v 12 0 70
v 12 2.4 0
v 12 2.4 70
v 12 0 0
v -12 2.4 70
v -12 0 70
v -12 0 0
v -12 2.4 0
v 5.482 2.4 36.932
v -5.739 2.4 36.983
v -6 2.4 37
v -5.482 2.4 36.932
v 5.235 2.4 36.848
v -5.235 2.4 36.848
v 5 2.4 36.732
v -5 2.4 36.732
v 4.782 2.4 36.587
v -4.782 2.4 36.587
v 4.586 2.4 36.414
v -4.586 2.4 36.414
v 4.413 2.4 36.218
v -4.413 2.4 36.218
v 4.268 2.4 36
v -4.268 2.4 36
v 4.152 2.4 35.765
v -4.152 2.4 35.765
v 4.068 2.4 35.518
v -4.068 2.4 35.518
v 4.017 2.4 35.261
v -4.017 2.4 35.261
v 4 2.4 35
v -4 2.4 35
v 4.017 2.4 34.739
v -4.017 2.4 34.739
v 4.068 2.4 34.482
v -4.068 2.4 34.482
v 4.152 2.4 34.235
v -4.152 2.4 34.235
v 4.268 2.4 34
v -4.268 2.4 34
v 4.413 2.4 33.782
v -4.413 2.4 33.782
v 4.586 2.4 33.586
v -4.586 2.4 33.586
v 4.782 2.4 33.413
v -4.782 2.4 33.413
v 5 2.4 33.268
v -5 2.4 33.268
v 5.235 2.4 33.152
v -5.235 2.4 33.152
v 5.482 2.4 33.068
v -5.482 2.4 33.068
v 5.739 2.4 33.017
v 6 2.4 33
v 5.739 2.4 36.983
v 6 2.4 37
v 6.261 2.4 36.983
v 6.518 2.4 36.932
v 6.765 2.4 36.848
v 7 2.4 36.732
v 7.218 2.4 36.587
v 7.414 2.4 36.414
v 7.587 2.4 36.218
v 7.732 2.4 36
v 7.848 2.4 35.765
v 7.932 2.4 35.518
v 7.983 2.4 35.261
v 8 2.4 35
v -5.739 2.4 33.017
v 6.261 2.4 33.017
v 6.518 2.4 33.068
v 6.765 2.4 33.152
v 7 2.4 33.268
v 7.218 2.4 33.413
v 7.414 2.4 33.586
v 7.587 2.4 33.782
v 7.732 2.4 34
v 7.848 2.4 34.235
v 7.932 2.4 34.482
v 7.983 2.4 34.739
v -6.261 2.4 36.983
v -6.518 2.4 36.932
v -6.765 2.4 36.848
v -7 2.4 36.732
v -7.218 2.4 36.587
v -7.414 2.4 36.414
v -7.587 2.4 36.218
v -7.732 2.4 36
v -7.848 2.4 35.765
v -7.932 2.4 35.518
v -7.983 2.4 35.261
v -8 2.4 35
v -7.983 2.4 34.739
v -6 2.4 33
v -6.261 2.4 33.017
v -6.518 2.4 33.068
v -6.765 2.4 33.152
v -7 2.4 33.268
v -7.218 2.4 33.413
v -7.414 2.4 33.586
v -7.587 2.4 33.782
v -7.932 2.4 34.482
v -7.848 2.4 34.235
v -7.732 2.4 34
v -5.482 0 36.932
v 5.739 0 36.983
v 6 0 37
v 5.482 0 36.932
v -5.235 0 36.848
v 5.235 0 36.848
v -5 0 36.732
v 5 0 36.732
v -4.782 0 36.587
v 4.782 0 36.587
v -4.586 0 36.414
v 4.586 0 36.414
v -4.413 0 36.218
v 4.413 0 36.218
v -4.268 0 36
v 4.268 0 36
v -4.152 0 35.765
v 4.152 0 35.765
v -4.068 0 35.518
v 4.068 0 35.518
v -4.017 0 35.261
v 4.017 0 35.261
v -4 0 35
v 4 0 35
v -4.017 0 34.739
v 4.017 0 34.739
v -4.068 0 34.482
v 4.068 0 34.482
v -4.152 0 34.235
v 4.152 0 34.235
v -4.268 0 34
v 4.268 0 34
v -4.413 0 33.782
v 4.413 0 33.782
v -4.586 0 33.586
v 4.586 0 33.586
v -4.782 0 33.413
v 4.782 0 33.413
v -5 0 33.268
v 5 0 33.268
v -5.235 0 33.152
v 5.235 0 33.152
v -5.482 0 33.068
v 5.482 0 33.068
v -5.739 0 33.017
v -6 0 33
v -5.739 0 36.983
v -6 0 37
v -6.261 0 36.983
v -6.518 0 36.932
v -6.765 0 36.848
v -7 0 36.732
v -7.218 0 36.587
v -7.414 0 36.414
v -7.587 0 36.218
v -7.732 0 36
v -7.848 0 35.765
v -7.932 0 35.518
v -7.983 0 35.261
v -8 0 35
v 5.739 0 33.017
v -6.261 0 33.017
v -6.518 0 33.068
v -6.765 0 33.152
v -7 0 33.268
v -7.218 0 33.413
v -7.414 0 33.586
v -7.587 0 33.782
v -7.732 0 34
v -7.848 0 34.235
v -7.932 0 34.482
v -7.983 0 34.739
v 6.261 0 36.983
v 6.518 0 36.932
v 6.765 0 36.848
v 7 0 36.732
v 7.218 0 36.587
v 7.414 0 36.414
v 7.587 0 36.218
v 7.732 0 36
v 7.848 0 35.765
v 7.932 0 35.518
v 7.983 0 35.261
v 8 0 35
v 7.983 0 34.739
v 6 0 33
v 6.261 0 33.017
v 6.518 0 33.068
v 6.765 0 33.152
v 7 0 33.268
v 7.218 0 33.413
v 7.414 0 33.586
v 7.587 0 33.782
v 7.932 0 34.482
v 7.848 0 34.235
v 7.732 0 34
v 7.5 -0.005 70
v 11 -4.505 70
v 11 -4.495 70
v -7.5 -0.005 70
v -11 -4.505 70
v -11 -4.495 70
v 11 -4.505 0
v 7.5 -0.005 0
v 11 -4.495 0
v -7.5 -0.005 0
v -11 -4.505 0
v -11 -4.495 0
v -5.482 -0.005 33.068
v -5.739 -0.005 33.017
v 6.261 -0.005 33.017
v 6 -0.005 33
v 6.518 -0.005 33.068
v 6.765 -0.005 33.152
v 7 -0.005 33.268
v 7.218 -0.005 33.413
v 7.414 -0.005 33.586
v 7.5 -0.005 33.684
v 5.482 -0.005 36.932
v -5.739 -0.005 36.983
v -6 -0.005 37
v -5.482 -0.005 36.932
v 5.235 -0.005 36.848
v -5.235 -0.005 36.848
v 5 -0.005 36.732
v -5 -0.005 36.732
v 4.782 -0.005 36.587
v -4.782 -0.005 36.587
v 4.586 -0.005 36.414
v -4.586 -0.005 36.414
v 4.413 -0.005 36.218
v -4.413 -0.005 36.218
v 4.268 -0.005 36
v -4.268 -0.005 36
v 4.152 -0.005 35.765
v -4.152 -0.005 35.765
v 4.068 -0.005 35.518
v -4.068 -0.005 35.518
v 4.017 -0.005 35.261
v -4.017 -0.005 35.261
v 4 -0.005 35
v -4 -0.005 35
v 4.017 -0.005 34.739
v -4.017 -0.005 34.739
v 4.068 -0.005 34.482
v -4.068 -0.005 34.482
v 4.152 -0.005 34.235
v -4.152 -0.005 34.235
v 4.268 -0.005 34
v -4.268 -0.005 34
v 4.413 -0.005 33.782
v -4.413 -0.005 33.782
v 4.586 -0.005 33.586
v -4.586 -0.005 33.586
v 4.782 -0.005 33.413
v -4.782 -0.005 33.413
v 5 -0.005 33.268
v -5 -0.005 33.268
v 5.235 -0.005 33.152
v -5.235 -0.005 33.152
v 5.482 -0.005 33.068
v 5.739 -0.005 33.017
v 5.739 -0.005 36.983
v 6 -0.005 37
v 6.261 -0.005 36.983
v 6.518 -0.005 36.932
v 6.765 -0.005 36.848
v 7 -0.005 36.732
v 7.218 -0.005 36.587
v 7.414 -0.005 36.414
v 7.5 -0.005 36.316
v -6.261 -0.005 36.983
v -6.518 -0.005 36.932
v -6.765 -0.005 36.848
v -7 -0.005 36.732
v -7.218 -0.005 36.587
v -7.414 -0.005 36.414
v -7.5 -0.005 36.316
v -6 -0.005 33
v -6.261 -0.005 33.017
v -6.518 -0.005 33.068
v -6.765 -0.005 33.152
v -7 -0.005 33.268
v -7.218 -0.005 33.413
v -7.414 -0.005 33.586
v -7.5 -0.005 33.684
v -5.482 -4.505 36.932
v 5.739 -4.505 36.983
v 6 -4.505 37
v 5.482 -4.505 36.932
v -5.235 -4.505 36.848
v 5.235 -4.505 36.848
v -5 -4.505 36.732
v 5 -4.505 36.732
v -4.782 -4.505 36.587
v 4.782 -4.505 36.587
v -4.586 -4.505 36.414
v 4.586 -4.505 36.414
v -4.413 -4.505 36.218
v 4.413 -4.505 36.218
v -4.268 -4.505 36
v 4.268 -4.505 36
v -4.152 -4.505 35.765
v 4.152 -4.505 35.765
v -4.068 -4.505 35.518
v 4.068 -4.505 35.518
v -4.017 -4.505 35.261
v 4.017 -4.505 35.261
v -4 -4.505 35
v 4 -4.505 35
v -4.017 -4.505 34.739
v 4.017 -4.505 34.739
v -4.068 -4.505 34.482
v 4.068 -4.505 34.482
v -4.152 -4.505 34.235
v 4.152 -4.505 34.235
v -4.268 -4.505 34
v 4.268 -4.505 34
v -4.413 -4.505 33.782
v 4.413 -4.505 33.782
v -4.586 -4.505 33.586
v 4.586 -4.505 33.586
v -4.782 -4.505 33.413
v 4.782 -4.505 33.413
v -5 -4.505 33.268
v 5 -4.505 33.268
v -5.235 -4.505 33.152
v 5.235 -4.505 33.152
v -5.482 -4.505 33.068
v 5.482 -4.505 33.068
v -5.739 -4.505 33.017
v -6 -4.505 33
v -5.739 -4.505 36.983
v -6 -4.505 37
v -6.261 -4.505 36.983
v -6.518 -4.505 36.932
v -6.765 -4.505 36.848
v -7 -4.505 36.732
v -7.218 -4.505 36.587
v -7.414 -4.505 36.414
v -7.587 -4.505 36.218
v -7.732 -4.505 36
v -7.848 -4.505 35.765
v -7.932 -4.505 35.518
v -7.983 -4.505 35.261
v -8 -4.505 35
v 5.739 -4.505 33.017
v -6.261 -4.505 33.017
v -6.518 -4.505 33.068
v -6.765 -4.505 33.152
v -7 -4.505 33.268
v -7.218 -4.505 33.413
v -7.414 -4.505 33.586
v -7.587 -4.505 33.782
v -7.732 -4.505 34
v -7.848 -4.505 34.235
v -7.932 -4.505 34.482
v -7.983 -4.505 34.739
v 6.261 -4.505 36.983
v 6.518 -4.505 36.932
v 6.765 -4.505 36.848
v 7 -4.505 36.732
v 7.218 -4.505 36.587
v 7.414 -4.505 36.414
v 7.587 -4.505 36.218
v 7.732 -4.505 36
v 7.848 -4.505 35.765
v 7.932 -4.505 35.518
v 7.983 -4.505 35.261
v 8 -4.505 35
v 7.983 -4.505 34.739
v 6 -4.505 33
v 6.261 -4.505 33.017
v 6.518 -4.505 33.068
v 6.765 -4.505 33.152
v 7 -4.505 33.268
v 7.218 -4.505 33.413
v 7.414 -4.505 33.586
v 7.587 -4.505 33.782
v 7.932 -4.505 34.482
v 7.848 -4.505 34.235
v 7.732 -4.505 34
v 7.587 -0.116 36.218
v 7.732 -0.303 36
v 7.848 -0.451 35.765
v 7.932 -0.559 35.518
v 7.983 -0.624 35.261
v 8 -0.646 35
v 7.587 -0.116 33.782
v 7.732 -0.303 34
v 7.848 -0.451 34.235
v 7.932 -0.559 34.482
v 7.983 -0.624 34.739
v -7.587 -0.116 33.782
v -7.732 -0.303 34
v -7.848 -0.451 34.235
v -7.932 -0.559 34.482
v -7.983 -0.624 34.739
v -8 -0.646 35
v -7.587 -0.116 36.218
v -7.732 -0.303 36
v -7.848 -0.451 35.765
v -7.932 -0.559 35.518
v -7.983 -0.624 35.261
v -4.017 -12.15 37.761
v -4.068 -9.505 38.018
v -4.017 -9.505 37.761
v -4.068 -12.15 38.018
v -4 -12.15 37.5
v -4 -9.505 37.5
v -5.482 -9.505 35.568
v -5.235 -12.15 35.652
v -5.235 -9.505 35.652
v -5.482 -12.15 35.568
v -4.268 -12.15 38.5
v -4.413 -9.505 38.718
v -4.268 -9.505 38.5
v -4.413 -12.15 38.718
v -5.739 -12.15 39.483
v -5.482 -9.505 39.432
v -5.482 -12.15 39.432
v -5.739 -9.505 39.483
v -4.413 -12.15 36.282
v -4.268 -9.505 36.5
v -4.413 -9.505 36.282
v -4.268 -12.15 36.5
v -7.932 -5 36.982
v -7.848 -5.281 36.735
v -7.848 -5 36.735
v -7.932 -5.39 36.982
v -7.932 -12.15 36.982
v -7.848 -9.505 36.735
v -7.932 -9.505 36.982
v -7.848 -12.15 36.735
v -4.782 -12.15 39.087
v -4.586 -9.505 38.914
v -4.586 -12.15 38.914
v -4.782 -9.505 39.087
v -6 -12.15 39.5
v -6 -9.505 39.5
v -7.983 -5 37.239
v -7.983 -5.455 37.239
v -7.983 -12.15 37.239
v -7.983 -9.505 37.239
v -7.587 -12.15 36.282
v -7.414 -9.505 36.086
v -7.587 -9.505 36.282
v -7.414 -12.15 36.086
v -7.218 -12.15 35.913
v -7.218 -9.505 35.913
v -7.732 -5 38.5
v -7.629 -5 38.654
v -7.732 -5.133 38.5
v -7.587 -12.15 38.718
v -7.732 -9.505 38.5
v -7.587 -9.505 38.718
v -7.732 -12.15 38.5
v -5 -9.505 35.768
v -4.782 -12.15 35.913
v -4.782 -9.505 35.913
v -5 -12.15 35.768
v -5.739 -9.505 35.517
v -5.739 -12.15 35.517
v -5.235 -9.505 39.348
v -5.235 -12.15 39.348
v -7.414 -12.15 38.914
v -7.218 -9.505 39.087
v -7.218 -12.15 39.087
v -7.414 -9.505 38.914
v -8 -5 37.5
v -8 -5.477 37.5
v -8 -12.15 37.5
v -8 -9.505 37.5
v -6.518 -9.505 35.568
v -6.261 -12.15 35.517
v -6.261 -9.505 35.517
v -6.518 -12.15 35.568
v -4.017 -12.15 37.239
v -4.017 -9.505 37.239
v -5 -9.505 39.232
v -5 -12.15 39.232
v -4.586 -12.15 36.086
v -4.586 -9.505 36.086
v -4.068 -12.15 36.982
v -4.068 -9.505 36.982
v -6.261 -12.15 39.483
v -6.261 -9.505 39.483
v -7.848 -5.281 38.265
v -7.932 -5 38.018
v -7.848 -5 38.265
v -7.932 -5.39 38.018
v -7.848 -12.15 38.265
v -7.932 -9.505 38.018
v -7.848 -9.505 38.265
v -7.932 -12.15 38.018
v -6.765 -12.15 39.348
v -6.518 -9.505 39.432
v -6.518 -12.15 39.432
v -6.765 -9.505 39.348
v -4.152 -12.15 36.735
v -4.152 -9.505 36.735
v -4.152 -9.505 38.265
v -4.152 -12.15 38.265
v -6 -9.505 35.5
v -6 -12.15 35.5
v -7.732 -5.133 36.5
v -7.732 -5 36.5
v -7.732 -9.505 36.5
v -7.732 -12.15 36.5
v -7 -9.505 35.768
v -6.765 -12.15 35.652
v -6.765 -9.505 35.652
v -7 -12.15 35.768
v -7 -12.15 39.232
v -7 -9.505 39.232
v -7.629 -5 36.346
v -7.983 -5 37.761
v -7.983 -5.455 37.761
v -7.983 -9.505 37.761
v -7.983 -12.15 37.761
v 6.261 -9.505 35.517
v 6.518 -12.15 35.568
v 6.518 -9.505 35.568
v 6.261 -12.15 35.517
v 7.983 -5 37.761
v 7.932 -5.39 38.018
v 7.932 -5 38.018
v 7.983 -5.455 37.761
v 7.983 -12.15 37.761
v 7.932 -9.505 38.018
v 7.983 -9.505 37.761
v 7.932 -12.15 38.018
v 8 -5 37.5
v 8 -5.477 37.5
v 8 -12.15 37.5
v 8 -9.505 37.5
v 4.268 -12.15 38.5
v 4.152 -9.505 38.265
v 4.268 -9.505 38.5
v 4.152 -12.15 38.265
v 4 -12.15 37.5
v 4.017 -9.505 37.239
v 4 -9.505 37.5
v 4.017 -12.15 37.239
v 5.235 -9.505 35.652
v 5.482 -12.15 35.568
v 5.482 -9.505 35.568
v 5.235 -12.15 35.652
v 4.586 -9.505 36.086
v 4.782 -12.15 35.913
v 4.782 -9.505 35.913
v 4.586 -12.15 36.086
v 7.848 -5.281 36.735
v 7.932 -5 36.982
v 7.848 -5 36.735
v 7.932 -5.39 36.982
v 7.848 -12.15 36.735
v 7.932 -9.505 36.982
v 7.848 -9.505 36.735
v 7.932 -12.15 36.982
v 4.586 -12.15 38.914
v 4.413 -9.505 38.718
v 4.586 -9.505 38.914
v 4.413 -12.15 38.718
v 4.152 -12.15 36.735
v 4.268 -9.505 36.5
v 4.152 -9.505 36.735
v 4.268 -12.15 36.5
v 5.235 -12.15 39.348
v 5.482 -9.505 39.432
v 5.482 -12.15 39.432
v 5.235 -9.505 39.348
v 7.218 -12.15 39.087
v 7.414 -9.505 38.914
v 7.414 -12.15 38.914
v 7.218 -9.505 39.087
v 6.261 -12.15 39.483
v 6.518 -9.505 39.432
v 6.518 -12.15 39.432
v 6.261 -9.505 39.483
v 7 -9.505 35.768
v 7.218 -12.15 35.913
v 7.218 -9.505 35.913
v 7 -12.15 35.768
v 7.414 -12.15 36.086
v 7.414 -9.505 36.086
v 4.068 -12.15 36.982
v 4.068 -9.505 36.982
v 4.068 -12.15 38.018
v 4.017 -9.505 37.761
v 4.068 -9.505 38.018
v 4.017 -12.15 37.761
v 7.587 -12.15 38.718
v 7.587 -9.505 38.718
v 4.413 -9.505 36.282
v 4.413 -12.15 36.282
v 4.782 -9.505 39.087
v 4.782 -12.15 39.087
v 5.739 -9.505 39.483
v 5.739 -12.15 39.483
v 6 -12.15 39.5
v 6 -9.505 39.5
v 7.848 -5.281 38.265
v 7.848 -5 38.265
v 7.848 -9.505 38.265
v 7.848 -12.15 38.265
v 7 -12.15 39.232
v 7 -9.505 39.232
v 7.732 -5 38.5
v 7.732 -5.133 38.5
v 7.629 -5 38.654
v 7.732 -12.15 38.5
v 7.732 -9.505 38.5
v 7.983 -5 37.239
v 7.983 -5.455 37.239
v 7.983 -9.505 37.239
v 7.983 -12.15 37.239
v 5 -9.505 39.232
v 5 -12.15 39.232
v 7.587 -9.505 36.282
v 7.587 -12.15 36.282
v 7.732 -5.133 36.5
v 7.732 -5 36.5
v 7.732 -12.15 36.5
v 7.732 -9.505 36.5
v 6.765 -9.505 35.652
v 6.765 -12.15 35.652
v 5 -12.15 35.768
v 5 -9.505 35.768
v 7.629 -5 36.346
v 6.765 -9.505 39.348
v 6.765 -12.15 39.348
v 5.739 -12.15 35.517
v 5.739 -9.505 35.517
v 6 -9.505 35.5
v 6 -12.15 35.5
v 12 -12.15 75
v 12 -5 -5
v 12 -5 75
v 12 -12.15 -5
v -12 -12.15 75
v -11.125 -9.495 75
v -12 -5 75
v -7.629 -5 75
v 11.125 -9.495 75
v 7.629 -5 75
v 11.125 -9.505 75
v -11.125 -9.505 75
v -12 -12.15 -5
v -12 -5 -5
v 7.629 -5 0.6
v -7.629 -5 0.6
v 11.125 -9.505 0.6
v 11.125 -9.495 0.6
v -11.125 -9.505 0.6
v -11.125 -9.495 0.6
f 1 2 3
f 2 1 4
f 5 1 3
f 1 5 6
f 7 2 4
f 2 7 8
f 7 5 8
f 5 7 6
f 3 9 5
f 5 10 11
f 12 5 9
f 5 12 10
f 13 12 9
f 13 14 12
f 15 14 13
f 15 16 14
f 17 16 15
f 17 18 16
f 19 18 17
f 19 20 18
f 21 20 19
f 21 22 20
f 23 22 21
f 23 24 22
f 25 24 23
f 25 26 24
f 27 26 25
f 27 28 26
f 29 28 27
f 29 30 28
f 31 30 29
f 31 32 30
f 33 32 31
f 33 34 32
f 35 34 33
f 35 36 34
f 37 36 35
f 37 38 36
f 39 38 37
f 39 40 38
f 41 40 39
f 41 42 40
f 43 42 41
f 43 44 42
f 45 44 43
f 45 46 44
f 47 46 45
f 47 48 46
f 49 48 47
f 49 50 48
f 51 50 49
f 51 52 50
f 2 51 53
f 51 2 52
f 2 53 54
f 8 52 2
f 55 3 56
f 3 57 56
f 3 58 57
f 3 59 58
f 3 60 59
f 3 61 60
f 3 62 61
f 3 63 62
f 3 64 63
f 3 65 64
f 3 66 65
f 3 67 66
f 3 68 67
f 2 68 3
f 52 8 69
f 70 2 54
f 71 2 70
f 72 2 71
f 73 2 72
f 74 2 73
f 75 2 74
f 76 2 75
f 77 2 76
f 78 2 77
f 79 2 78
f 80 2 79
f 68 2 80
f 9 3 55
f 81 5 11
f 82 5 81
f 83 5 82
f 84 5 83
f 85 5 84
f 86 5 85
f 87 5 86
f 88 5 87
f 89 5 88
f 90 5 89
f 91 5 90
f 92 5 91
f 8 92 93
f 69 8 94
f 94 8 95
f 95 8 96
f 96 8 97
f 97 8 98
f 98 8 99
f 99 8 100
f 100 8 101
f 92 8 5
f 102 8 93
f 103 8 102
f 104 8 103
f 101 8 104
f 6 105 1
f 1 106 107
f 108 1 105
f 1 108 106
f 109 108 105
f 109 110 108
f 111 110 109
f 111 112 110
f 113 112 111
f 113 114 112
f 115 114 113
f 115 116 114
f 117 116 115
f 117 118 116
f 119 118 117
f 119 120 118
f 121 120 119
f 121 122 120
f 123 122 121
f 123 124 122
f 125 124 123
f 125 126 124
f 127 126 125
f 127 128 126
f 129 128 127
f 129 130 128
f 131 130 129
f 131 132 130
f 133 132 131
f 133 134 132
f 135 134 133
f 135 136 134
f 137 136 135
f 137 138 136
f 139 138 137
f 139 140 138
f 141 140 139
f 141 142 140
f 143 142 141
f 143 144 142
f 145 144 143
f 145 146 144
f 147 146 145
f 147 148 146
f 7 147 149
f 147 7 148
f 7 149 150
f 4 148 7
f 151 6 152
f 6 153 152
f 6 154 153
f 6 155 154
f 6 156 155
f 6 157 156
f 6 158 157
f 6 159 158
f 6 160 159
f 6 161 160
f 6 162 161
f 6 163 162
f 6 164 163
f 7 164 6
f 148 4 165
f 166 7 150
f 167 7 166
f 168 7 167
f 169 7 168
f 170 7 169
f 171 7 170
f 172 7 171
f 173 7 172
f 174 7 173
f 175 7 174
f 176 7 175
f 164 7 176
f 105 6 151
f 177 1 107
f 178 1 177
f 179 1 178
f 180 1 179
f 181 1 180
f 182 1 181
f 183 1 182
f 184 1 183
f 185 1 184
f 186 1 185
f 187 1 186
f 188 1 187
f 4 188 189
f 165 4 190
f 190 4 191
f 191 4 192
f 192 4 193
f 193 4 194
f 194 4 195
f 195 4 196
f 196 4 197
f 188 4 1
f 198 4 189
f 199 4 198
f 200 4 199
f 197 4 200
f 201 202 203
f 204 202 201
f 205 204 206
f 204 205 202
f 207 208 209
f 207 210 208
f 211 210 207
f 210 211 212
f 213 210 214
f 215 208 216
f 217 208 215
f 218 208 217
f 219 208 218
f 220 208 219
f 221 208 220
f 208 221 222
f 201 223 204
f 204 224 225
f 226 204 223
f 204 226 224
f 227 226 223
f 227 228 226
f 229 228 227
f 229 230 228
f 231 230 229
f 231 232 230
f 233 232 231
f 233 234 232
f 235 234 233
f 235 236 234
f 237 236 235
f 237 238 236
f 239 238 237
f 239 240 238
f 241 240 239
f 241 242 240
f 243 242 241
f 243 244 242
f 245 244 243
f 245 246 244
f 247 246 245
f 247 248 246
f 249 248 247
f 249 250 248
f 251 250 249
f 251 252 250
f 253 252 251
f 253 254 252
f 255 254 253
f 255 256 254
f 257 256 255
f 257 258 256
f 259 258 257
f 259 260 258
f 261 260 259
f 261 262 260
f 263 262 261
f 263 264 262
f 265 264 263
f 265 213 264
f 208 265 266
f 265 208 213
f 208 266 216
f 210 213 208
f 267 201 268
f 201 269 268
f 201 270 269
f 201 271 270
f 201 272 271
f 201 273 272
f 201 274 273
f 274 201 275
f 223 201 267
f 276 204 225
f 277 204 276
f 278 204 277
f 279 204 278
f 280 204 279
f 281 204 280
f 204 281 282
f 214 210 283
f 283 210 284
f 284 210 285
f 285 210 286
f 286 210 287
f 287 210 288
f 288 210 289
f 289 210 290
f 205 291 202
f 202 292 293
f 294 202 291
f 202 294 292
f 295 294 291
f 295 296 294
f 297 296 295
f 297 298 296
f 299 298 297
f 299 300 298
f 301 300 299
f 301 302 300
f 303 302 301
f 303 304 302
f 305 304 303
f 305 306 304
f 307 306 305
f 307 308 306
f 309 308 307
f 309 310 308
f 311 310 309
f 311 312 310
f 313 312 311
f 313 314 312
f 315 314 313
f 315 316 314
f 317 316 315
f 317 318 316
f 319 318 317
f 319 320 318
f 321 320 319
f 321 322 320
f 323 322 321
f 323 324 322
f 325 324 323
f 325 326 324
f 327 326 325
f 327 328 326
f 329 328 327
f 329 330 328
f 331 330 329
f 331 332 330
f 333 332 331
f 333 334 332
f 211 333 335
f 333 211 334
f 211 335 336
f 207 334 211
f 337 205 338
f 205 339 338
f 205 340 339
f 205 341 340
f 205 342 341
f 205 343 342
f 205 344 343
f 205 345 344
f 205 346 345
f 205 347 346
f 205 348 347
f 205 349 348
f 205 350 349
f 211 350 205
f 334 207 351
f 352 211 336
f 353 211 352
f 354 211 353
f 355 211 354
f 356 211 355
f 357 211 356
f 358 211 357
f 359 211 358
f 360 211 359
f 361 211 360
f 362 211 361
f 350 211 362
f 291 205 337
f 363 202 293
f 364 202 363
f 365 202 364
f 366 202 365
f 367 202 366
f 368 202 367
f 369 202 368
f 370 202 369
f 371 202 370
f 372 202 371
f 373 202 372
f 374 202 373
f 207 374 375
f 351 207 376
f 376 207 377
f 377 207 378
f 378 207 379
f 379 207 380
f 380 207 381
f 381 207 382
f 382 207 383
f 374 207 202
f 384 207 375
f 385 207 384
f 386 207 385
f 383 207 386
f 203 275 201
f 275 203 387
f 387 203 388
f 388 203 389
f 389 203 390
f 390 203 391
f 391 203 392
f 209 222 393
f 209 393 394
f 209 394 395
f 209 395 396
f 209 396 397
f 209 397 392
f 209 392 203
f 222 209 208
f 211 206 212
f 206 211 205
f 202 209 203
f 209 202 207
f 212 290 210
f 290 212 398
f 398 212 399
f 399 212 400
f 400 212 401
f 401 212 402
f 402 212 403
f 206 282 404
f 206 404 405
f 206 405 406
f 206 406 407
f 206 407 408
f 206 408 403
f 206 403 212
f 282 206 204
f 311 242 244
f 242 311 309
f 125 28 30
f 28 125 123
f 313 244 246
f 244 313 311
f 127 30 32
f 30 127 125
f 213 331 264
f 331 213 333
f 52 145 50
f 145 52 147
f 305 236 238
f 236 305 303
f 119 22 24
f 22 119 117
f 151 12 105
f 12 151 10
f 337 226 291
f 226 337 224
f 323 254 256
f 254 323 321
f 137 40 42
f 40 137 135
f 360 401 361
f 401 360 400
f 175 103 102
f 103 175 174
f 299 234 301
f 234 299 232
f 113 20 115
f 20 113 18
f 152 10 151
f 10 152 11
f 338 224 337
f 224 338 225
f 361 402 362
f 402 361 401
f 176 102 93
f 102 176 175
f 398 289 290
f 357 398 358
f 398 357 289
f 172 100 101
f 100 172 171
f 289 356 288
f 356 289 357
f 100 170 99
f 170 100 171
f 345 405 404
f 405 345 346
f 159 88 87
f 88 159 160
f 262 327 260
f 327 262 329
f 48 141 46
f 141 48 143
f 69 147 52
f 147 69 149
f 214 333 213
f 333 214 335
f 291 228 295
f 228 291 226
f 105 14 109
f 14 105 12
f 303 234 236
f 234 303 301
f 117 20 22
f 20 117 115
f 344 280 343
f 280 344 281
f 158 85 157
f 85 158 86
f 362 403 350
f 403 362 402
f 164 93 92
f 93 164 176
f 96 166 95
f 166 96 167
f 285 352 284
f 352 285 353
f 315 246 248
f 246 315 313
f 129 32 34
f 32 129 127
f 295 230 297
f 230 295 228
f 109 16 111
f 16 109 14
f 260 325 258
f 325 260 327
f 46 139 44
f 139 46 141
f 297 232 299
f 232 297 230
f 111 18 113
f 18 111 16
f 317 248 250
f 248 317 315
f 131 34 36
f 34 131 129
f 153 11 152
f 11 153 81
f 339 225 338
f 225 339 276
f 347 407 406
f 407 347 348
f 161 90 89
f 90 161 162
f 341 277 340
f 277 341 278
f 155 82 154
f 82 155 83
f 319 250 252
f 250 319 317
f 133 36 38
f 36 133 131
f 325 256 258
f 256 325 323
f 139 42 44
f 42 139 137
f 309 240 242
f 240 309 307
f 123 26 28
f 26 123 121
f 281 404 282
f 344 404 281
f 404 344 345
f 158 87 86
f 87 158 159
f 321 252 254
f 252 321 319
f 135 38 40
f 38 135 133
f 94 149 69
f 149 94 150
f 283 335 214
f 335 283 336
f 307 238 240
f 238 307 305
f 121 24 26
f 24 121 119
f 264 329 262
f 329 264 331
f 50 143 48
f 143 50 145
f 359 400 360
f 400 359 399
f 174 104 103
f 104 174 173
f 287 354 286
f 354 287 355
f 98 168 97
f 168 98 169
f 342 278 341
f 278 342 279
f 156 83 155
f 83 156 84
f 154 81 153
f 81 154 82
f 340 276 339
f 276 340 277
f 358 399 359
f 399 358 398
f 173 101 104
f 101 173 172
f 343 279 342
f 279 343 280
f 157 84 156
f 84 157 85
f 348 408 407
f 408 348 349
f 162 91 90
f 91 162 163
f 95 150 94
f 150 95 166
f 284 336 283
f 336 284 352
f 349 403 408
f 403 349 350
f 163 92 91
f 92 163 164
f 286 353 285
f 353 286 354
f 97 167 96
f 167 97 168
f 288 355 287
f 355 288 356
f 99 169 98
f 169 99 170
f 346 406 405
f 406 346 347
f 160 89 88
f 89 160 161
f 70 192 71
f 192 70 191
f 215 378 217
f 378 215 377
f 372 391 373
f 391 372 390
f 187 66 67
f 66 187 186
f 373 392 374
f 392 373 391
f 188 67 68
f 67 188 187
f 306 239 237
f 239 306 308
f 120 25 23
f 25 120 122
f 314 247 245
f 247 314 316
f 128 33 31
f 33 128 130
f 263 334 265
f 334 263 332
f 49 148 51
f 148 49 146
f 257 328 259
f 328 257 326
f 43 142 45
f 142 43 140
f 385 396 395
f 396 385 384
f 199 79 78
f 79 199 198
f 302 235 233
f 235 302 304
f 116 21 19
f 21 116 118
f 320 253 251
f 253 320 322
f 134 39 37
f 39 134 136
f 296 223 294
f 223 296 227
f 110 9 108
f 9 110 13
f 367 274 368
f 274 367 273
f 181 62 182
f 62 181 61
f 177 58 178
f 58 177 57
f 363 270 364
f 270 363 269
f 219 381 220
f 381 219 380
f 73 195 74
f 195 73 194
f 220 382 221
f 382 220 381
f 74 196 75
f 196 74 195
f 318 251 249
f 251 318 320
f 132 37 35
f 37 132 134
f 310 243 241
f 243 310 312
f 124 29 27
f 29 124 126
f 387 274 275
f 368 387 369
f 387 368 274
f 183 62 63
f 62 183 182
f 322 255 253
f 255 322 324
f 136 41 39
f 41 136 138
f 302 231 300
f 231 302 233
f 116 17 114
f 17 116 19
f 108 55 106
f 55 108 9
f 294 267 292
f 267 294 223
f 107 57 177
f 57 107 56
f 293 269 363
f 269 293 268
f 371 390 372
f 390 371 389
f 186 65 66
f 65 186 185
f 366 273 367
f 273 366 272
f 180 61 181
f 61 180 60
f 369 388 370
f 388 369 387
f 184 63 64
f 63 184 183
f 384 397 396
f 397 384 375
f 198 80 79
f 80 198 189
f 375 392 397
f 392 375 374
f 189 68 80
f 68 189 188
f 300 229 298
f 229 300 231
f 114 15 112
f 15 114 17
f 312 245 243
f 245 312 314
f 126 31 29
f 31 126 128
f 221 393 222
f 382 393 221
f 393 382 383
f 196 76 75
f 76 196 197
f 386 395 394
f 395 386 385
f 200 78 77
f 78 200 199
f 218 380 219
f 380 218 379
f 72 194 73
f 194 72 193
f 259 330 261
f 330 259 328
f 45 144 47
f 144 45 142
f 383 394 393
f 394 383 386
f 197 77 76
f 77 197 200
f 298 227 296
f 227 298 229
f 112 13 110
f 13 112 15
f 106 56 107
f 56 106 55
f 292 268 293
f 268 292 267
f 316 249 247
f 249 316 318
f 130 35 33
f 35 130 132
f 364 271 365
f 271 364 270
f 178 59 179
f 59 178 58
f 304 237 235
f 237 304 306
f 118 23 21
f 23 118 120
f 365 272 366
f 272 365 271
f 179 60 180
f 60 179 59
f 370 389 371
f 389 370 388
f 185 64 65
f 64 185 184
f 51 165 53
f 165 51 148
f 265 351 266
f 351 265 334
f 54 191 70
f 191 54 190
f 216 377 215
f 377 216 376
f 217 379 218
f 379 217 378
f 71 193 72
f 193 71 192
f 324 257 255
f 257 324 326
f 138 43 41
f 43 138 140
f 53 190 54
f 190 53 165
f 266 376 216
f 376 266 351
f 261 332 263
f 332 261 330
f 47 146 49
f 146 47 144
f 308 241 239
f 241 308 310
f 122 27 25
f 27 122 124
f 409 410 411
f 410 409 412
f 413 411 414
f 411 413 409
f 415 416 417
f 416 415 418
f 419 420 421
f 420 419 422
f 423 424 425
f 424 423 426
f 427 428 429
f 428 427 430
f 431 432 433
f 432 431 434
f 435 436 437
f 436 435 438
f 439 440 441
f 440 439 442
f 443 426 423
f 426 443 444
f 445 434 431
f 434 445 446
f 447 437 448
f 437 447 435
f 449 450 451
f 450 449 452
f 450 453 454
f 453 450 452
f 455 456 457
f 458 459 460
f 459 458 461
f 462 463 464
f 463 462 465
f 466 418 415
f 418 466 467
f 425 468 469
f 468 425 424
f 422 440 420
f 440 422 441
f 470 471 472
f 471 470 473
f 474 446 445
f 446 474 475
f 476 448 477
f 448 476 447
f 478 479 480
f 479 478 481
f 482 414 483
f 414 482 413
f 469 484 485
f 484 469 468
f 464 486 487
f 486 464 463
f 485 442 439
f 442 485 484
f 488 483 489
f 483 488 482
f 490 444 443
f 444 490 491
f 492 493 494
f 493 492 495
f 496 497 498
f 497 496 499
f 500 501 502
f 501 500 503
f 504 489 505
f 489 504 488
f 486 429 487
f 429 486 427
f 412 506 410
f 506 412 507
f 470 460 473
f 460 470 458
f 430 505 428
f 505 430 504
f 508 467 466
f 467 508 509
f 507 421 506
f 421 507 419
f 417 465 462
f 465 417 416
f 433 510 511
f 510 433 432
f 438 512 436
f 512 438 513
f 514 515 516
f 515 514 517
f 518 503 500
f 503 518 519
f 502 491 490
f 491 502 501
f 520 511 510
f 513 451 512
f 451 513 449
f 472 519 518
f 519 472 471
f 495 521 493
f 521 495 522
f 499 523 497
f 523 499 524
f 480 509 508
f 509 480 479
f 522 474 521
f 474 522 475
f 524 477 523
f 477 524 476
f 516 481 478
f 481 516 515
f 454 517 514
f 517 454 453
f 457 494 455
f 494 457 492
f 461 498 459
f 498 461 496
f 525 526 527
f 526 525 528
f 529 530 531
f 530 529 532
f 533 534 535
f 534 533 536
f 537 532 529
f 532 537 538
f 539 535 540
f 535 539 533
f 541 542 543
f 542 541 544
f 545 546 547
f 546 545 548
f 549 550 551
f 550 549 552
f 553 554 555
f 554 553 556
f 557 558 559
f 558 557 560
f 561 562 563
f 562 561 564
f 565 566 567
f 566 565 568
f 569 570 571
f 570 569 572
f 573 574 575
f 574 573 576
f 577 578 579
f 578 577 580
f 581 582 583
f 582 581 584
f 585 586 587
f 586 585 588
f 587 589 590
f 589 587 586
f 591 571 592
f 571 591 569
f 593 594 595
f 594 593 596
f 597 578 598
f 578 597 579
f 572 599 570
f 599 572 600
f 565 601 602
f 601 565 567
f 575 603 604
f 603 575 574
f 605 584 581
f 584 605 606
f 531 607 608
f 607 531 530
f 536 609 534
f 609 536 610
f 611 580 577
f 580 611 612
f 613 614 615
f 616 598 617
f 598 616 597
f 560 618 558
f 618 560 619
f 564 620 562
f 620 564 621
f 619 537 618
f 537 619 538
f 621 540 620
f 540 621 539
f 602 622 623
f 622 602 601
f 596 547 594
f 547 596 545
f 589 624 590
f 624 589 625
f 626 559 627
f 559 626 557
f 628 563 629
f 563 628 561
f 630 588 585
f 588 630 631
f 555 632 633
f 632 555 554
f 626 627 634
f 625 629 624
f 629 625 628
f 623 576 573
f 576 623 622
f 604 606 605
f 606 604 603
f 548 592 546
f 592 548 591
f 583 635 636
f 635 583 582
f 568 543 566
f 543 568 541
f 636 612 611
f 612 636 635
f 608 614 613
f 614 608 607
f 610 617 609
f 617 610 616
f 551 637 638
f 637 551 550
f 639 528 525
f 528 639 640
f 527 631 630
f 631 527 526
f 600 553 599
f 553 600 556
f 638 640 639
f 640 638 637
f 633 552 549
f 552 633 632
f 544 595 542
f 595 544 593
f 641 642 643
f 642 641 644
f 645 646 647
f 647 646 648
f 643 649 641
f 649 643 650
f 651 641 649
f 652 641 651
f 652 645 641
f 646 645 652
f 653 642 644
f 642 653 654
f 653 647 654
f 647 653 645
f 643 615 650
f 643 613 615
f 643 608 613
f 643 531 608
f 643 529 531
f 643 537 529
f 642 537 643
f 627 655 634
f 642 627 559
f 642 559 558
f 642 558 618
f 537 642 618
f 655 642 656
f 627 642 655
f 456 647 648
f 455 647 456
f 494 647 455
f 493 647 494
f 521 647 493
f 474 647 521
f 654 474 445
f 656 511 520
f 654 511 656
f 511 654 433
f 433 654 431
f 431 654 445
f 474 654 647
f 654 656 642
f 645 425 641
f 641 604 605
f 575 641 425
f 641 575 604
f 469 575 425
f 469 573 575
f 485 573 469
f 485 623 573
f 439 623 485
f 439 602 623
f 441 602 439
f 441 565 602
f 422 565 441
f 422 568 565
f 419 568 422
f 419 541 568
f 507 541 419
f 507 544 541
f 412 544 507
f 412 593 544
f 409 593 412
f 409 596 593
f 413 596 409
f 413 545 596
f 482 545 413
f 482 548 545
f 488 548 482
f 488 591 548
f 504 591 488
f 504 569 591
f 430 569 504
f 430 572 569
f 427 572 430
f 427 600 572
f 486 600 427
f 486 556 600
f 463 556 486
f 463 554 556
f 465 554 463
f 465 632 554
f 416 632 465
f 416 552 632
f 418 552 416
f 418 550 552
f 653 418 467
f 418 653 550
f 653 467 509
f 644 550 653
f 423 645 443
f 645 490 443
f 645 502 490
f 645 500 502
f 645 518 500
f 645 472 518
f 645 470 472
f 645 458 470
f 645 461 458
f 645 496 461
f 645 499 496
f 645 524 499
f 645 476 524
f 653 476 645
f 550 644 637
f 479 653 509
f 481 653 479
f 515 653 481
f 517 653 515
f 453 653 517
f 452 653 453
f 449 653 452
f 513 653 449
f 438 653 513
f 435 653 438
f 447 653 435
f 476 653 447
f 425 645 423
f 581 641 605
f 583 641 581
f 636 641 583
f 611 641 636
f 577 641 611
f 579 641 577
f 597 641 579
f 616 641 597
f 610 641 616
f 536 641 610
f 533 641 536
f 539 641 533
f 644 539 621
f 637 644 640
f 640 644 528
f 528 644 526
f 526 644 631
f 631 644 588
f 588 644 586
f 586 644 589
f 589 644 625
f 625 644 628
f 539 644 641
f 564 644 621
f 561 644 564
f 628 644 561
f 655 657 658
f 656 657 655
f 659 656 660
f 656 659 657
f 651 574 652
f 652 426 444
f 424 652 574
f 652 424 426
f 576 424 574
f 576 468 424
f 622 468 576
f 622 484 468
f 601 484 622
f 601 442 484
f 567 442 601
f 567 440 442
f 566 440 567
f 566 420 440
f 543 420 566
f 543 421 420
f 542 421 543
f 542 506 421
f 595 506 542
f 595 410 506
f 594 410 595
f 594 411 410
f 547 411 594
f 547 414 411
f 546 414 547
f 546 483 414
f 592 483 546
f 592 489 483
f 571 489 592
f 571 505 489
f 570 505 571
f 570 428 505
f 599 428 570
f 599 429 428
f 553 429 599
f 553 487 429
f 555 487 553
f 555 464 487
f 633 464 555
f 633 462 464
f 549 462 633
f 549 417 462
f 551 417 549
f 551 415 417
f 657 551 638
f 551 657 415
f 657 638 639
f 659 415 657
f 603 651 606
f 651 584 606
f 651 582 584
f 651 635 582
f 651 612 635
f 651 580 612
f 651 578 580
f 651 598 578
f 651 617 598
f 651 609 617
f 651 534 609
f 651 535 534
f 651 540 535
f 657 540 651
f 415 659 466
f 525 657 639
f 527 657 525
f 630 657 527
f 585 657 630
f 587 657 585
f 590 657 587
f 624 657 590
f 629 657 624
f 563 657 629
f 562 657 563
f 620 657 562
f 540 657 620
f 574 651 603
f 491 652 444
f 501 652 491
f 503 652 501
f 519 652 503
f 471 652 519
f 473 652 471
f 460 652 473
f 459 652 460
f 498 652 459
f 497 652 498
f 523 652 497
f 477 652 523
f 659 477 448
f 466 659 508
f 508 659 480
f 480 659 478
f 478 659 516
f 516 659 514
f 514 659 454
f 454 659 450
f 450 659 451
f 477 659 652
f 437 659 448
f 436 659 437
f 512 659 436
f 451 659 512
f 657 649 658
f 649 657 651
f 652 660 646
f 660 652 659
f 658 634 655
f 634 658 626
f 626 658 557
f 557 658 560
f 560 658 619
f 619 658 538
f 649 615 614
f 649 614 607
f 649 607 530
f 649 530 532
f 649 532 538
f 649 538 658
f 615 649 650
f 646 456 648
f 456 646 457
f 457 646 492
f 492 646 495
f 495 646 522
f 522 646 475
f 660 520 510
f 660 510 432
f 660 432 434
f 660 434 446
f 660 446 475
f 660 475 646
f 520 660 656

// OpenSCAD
/* ========================================================================== 
   Dovetail Model for 3D Printing
   Designed by Notydesign
   License: CC BY-NC-SA 4.0 (https://creativecommons.org/licenses/by-nc-sa/4.0/)
   Source: https://github.com/Noty-design/Parametric-designs
   
   Description: Dovetail from the box/bin model, extracted and parameterized. 
   The dovetail can be screwed or glued to the back of what is mounted. 
   Designed by Notydesign.  
   Comments and documentation added for easier maintenance.  

    This file is intentionally heavily commented so future parameter and geometry
   changes are easier to make safely.
   ========================================================================== */ 

// All dimensions in this file are millimeters. 
// X is width, Y is depth/thickness, and Z is height. 

/* [Display options] */ // Groups settings that control preview visibility.
show_dovetail = true; // Shows the male dovetail part.
show_bracket = true; // Shows the female bracket part.
mirror_backstop = false; // Rotates the preview 180 degrees around the Y axis so the stop is mirrored.
color = "#4682B4"; // Sets the preview color for both generated parts.

/* [Dovetail male parameters] */ // Groups the main dimensions for the male dovetail.
dovetail_width_wide = 22; // Sets the widest width of the dovetail profile at the outer face.
dovetail_width_narrow = 15; // Sets the narrowest width of the dovetail profile near the plate.
dovetail_depth = 4.5; // Sets how far the dovetail profile projects in the Y direction.
dovetail_tolerance = 0.25; // Sets clearance between the male and female parts for 3D printing fit.
dovetail_plate_width = 24; // Sets the width of the male mounting plate.
dovetail_plate_thickness = 2.4; // Sets the thickness of the male mounting plate.
dovetail_plate_height = 70; // Sets the total height of the male dovetail part.

/* [Dovetail male screw hole parameters] */ // Groups screw-hole settings for the male part.
show_dovetail_screw_holes = true; // Enables through screw holes in the male part.
dovetail_screw_count = 2; // Sets the number of screw holes per row in the X direction.
dovetail_screw_row_count = 1; // Sets the number of screw rows in the Z direction.
dovetail_screw_row_spacing = 20; // Sets the center-to-center spacing between screw rows.
dovetail_screw_edge_margin = 6; // Sets the margin from each side edge to the outermost screw hole.
mount_screw_hole_diameter = 4; // Sets the diameter of the male screw holes.

/* [Dovetail male countersink parameters] */ // Groups countersink settings for the male screw holes.
male_screw_countersink_style = "none"; // [none, cone, cylinder, nut]
male_screw_countersink_side = "back"; // Selects the countersink side: front, back, or both.
male_screw_countersink_diameter = 8; // Sets the outer diameter of the male countersink.
male_screw_countersink_depth = 1.6; // Sets how deep the male countersink cuts into the part.
male_screw_nut_size = "M4"; // [M2, M3, M4, M5, M6, M7, M8, M9, M10, M11, M12, M13, M14]

/* [Dovetail female parameters] */ // Groups the main dimensions for the female bracket.
dovetail_female_extra_height = 5; // Adds extra height above the nominal male-part height.
dovetail_female_extra_width = 0; // Adds extra side material to the female block.
dovetail_female_rail_rib_depth = 0; // Adds outside 45-degree strengthening ribs when greater than zero.
dovetail_female_backstop_bridge_height = 0.6; // Keeps a small solid bridge above the stop so the bracket remains one connected body.
female_backstop = 5.0; // Sets the stop height below the slot so the male part cannot slide through.

/* [Dovetail female screw hole parameters] */ // Groups screw-hole settings for the female part.
show_female_screw_holes = true; // Enables through screw holes in the female part.
dovetail_female_screw_count = 2; // Sets the number of female screw holes per row in the X direction.
dovetail_female_screw_row_count = 1; // Sets the number of female screw rows in the Z direction.
dovetail_female_screw_row_spacing = 20; // Sets the center-to-center spacing between female screw rows.
dovetail_female_screw_edge_margin = 6; // Sets the margin from each female side edge to the outermost screw hole.
dovetail_female_mount_screw_hole_diameter = 4; // Sets the diameter of the female screw holes.

/* [Metric nut countersink parameters] */ // Groups settings for hexagonal metric-nut-shaped countersinks.
metric_nut_countersink_clearance = 0.25; // Adds extra flat-to-flat clearance to metric nut pockets for printer tolerance.

/* [Dovetail female countersink parameters] */ // Groups countersink settings for the female screw holes.
female_screw_countersink_style = "none"; // [none, cone, cylinder, nut]
female_screw_countersink_side = "front"; // Selects the countersink side: front, back, or both.
female_screw_countersink_diameter = 8; // Sets the outer diameter of the female countersink.
female_screw_countersink_depth = 1.6; // Sets how deep the female countersink cuts into the part.
female_screw_nut_size = "M4"; // [M2, M3, M4, M5, M6, M7, M8, M9, M10, M11, M12, M13, M14]

/* [Helper variables] */ // Groups internal helper values.
distance_between_brackets = -5.0; // Offsets the female bracket in Y so both parts are visible in preview.

/* Main preview */ // Starts the top-level rendering logic.
if (mirror_backstop) { // Uses a rotated render group when the mirrored view is enabled.
    translate([0, 0, dovetail_plate_height]) // Moves the model upward before rotation so it stays near the work plane.
    rotate([0, 180, 0]) { // Rotates the selected preview geometry 180 degrees around the Y axis.
        if (show_dovetail) { // Checks whether the male part should be displayed.
            dovetail_male(); // Renders the male dovetail part.
        } // Ends the mirrored male-part visibility check.
        if (show_bracket) { // Checks whether the female bracket should be displayed.
            dovetail_female(); // Renders the female bracket part.
        } // Ends the mirrored female-part visibility check.
    } // Ends the rotated preview group.
} else { // Uses the normal orientation when mirroring is disabled.
    if (show_dovetail) { // Checks whether the male part should be displayed.
        dovetail_male(); // Renders the male dovetail part.
    } // Ends the male-part visibility check.
    if (show_bracket) { // Checks whether the female bracket should be displayed.
        dovetail_female(); // Renders the female bracket part.
    } // Ends the female-part visibility check.
} // Ends the top-level rendering logic.

module dovetail_male() { // Defines the male part with plate, dovetail profile, and optional screw holes.
    color(color) // Applies the preview color to the male part.
    difference() { // Creates the final shape by subtracting holes from the solid geometry.
        union() { // Combines the mounting plate and dovetail profile into one body.
            translate([-dovetail_plate_width / 2, 0, 0]) // Centers the mounting plate in the X direction.
            cube([dovetail_plate_width, dovetail_plate_thickness, dovetail_plate_height]); // Creates the flat mounting plate.

            translate([0, 0, dovetail_plate_height / 2]) // Moves the profile so it is centered over the part height.
            hull() { // Builds a trapezoid-like dovetail profile between two thin rectangles.
                translate([0, -0.01, 0]) // Places the narrow profile line near the plate face.
                cube([dovetail_width_narrow, 0.01, dovetail_plate_height], center = true); // Creates the narrow side of the dovetail profile.

                translate([0, -dovetail_depth, 0]) // Places the wide profile line at the outer Y position.
                cube([dovetail_width_wide, 0.01, dovetail_plate_height], center = true); // Creates the wide side of the dovetail profile.
            } // Ends the hull used for the male profile.
        } // Ends the male solid geometry.

        if (show_dovetail_screw_holes) { // Cuts screw holes only when the setting is enabled.
            hole_positions = (dovetail_screw_count == 1) ? [0] // Uses the center position when only one screw hole is requested.
                : [for (i = [0 : dovetail_screw_count - 1]) // Calculates multiple screw holes evenly across the plate width.
                    -dovetail_plate_width / 2 + dovetail_screw_edge_margin + i * (dovetail_plate_width - 2 * dovetail_screw_edge_margin) / max(1, dovetail_screw_count - 1)]; // Returns X positions with edge margins.
            row_count = max(1, dovetail_screw_row_count); // Ensures at least one screw row is used.
            row_positions = (row_count == 1) ? [dovetail_plate_height / 2] // Centers a single row on the part height.
                : [for (r = [0 : row_count - 1]) // Calculates multiple rows in the Z direction.
                    dovetail_plate_height / 2 - ((row_count - 1) * dovetail_screw_row_spacing) / 2 + r * dovetail_screw_row_spacing]; // Returns Z positions centered around the part midpoint.
            for (x_pos = hole_positions) { // Iterates over every calculated X position.
                for (z_pos = row_positions) { // Iterates over every calculated Z position.
                    screw_hole_with_countersink( // Cuts one through hole and any requested countersink.
                        x_pos = x_pos, // Passes the screw-hole X position.
                        y_pos = dovetail_plate_thickness / 2, // Places the cutter through the plate in the Y direction.
                        z_pos = z_pos, // Passes the screw-hole Z position.
                        hole_length = dovetail_depth + dovetail_plate_thickness + 5, // Makes the cutter longer than the part so it fully clears the geometry.
                        hole_diameter = mount_screw_hole_diameter, // Passes the male screw-hole diameter.
                        countersink_style = male_screw_countersink_style, // Passes the selected countersink style.
                        countersink_side = male_screw_countersink_side, // Passes the selected countersink side.
                        countersink_diameter = male_screw_countersink_diameter, // Passes the countersink diameter.
                        countersink_depth = male_screw_countersink_depth, // Passes the countersink depth.
                        nut_size = male_screw_nut_size, // Passes the selected male nut-pocket size.
                        front_surface_y = -dovetail_depth, // Defines the front surface at the dovetail side.
                        back_surface_y = dovetail_plate_thickness // Defines the back surface at the plate side.
                    ); // Ends the hole-and-countersink cutter call.
                } // Ends the Z-position loop.
            } // Ends the X-position loop.
        } // Ends the male screw-hole condition.
    } // Ends the male difference operation.
} // Ends the male dovetail module.

module dovetail_female() { // Defines the female bracket with receiving slot, stop, ribs, and screw holes.
    dovetail_female_width = dovetail_plate_width + dovetail_female_extra_width; // Calculates the total female block width.
    dovetail_female_bridge_height = min(dovetail_female_backstop_bridge_height, max(0, dovetail_female_extra_height)); // Limits the bridge height to the available extra height.
    dovetail_female_slot_height = dovetail_plate_height + dovetail_female_extra_height - dovetail_female_bridge_height + 0.1; // Calculates the slot cutter height with a small overlap.

    color(color) // Applies the preview color to the female bracket.
    translate([0, distance_between_brackets, 0]) // Moves the female bracket in Y for a clearer preview.
    difference() { // Creates the female bracket by subtracting slot and holes from the block.
        union() { // Combines the solid block and optional ribs.
            translate([-dovetail_female_width / 2, -dovetail_depth - dovetail_plate_thickness - dovetail_tolerance, -female_backstop]) // Places the block with the stop below the zero plane.
            cube([dovetail_female_width, dovetail_depth + dovetail_plate_thickness + dovetail_tolerance, dovetail_plate_height + dovetail_female_extra_height + female_backstop]); // Creates the solid receiving block.

            if (dovetail_female_rail_rib_depth > 0) { // Adds ribs only when rib depth is enabled.
                female_rail_ribs(dovetail_female_width, dovetail_female_rail_rib_depth); // Creates strengthening ribs along the outside of the slot rails.
            } // Ends the rib condition.
        } // Ends the female solid geometry.

        translate([0, 0, dovetail_female_bridge_height + dovetail_female_slot_height / 2]) // Positions the slot cutter above the stop and bridge.
        hull() { // Builds a trapezoid-like negative volume matching the male profile.
            translate([0, 0, 0]) // Places the narrow negative profile line at the slot front.
            cube([dovetail_width_narrow + dovetail_tolerance, 0.01, dovetail_female_slot_height], center = true); // Cuts the narrow slot side with tolerance.

            translate([0, -dovetail_depth, 0]) // Places the wide negative profile line farther back in the slot.
            cube([dovetail_width_wide + dovetail_tolerance, 0.01, dovetail_female_slot_height], center = true); // Cuts the wide slot side with tolerance.
        } // Ends the hull used to cut the female slot.

        if (show_female_screw_holes) { // Cuts female screw holes only when the setting is enabled.
            female_front_screw_surface_y = -dovetail_depth; // Defines the slot-bottom/front surface Y position for countersinks.
            female_back_screw_surface_y = -dovetail_depth - dovetail_plate_thickness - dovetail_tolerance; // Defines the back surface Y position for countersinks.

            hole_positions = (dovetail_female_screw_count == 1) ? [0] // Uses the center position when only one female screw hole is requested.
                : [for (i = [0 : dovetail_female_screw_count - 1]) // Calculates multiple female screw holes evenly across the width.
                    -dovetail_female_width / 2 + dovetail_female_screw_edge_margin + i * (dovetail_female_width - 2 * dovetail_female_screw_edge_margin) / max(1, dovetail_female_screw_count - 1)]; // Returns X positions with female edge margins.

            row_count = max(1, dovetail_female_screw_row_count); // Ensures at least one female screw row is used.
            row_positions = (row_count == 1) ? [dovetail_plate_height / 2 + dovetail_female_extra_height / 2] // Centers a single row over the active female height.
                : [for (r = [0 : row_count - 1]) // Calculates multiple female rows in the Z direction.
                    dovetail_plate_height / 2 + dovetail_female_extra_height / 2 - ((row_count - 1) * dovetail_female_screw_row_spacing) / 2 + r * dovetail_female_screw_row_spacing]; // Returns Z positions centered around the female bracket.

            for (x_pos = hole_positions) { // Iterates over every calculated female X position.
                for (z_pos = row_positions) { // Iterates over every calculated female Z position.
                    screw_hole_with_countersink( // Cuts one female through hole and any requested countersink.
                        x_pos = x_pos, // Passes the screw-hole X position.
                        y_pos = -dovetail_plate_thickness / 2, // Places the cutter through the female block wall.
                        z_pos = z_pos, // Passes the screw-hole Z position.
                        hole_length = dovetail_depth + dovetail_plate_thickness + 6, // Makes the cutter long enough to fully clear the female wall.
                        hole_diameter = dovetail_female_mount_screw_hole_diameter, // Passes the female screw-hole diameter.
                        countersink_style = female_screw_countersink_style, // Passes the female countersink style.
                        countersink_side = female_screw_countersink_side, // Passes the female countersink side.
                        countersink_diameter = female_screw_countersink_diameter, // Passes the female countersink diameter.
                        countersink_depth = female_screw_countersink_depth, // Passes the female countersink depth.
                        nut_size = female_screw_nut_size, // Passes the selected female nut-pocket size.
                        front_surface_y = female_front_screw_surface_y, // Defines the female front surface for countersinking.
                        back_surface_y = female_back_screw_surface_y // Defines the female back surface for countersinking.
                    ); // Ends the female hole-and-countersink cutter call.
                } // Ends the female Z-position loop.
            } // Ends the female X-position loop.
        } // Ends the female screw-hole condition.
    } // Ends the female difference operation.
} // Ends the female bracket module.

module female_rail_ribs(female_width, rib_depth) { // Defines optional outside strengthening ribs for the female bracket.
    rib_height = dovetail_plate_height + dovetail_female_extra_height + female_backstop; // Calculates the full rib height including the stop.
    rib_y_back = -dovetail_depth - dovetail_plate_thickness - dovetail_tolerance; // Defines the back Y position of each rib.
    rib_y_front = -dovetail_depth; // Defines the front Y position of each rib near the slot.
    rib_width = min(rib_depth, max(0.01, dovetail_female_extra_width / 2 + (dovetail_plate_width - dovetail_width_wide - dovetail_tolerance) / 2)); // Limits rib width so it fits beside the slot.

    for (side = [-1, 1]) { // Creates one rib on the left side and one on the right side.
        hull() { // Builds a tapered rib between a wider rear edge and a narrow front edge.
            translate([side * (female_width / 2 - rib_width / 2), rib_y_back, rib_height / 2 - female_backstop]) // Places the wide rear edge of the rib.
            cube([rib_width, 0.01, rib_height], center = true); // Creates the wide rear rib face.

            translate([side * (female_width / 2 - rib_width / 2), rib_y_front, rib_height / 2 - female_backstop]) // Places the narrow front edge of the rib.
            cube([0.01, 0.01, rib_height], center = true); // Creates the rib tip near the slot.
        } // Ends the hull for one rib.
    } // Ends the side loop for the ribs.
} // Ends the rib module.

module screw_hole_with_countersink( // Defines a through hole with an optional countersink.
    x_pos, // Receives the hole X position.
    y_pos, // Receives the hole Y position.
    z_pos, // Receives the hole Z position.
    hole_length, // Receives the cutting length of the hole.
    hole_diameter, // Receives the hole diameter.
    countersink_style, // Receives the countersink style.
    countersink_side, // Receives which side should be countersunk.
    countersink_diameter, // Receives the countersink diameter.
    countersink_depth, // Receives the countersink depth.
    nut_size, // Receives the selected metric nut-pocket size.
    front_surface_y, // Receives the front surface Y position.
    back_surface_y // Receives the back surface Y position.
) { // Starts the hole module body.
    translate([x_pos, y_pos, z_pos]) // Places the cylinder where the hole should be cut.
    rotate([90, 0, 0]) // Rotates the cylinder so the hole runs along the Y axis.
    cylinder(h = hole_length, d = hole_diameter, center = true, $fn = 48); // Creates the negative cylinder for the round through hole.

    if (countersink_style != "none" && countersink_depth > 0) { // Creates countersinks only when a style and positive depth are set.
        if (countersink_side == "front" || countersink_side == "both") { // Checks whether the front side should be countersunk.
            screw_countersink_at( // Cuts one countersink at the front surface.
                x_pos = x_pos, // Passes the hole X position.
                surface_y = front_surface_y, // Passes the front surface Y position.
                z_pos = z_pos, // Passes the hole Z position.
                hole_diameter = hole_diameter, // Passes the through-hole diameter.
                countersink_style = countersink_style, // Passes the countersink style.
                countersink_diameter = countersink_diameter, // Passes the countersink diameter.
                countersink_depth = countersink_depth, // Passes the countersink depth.
                nut_size = nut_size, // Passes the selected metric nut-pocket size.
                inward_direction_y = (front_surface_y < back_surface_y) ? 1 : -1 // Calculates the inward cutting direction from the front surface.
            ); // Ends the front countersink call.
        } // Ends the front countersink condition.

        if (countersink_side == "back" || countersink_side == "both") { // Checks whether the back side should be countersunk.
            screw_countersink_at( // Cuts one countersink at the back surface.
                x_pos = x_pos, // Passes the hole X position.
                surface_y = back_surface_y, // Passes the back surface Y position.
                z_pos = z_pos, // Passes the hole Z position.
                hole_diameter = hole_diameter, // Passes the through-hole diameter.
                countersink_style = countersink_style, // Passes the countersink style.
                countersink_diameter = countersink_diameter, // Passes the countersink diameter.
                countersink_depth = countersink_depth, // Passes the countersink depth.
                nut_size = nut_size, // Passes the selected metric nut-pocket size.
                inward_direction_y = (back_surface_y < front_surface_y) ? 1 : -1 // Calculates the inward cutting direction from the back surface.
            ); // Ends the back countersink call.
        } // Ends the back countersink condition.
    } // Ends the countersink logic.
} // Ends the hole-with-countersink module.

function nut_corner_to_corner_diameter(nut_size, hole_diameter) = // Converts the selected nut size to a hex corner-to-corner diameter.
    max((metric_nut_across_flats(nut_size) + metric_nut_countersink_clearance) / cos(30), hole_diameter / cos(30)); // Keeps the hex pocket at least as wide as the round hole.

function metric_nut_across_flats(nut_size) = // Returns common ISO metric hex nut flat-to-flat width in millimeters.
    nut_size == "M2" ? 4 :
    nut_size == "M3" ? 5.5 :
    nut_size == "M4" ? 7 :
    nut_size == "M5" ? 8 :
    nut_size == "M6" ? 10 :
    nut_size == "M7" ? 11 :
    nut_size == "M8" ? 13 :
    nut_size == "M9" ? 15 :
    nut_size == "M10" ? 17 :
    nut_size == "M11" ? 18 :
    nut_size == "M12" ? 19 :
    nut_size == "M13" ? 21 :
    nut_size == "M14" ? 22 :
    4; // Falls back to an M2-sized flat width if an unknown value is used.

module screw_countersink_at( // Defines one countersink at a specified surface.
    x_pos, // Receives the countersink X position.
    surface_y, // Receives the Y position of the surface where the countersink starts.
    z_pos, // Receives the countersink Z position.
    hole_diameter, // Receives the base through-hole diameter.
    countersink_style, // Receives the countersink style.
    countersink_diameter, // Receives the requested countersink diameter.
    countersink_depth, // Receives the requested countersink depth.
    nut_size, // Receives the selected metric nut-pocket size.
    inward_direction_y // Receives the inward cutting direction along the Y axis.
) { // Starts the countersink module body.
    safe_countersink_diameter = max(countersink_diameter, hole_diameter); // Ensures the countersink is never smaller than the through hole.
    translate([x_pos, surface_y - inward_direction_y * 0.01, z_pos]) // Places the countersink with a tiny overlap against the surface.
    rotate([inward_direction_y > 0 ? -90 : 90, 0, 0]) { // Rotates the countersink so it cuts into the material.
        if (countersink_style == "cone") { // Selects a conical countersink.
            cylinder( // Creates the conical negative volume.
                h = countersink_depth + 0.02, // Adds a small extra depth for reliable boolean subtraction.
                d1 = safe_countersink_diameter, // Sets the outer diameter at the surface.
                d2 = hole_diameter, // Sets the inner diameter at the through hole.
                center = false, // Starts the cylinder at the surface instead of centering it.
                $fn = 64 // Uses more facets for a smoother countersink.
            ); // Ends the conical cylinder.
        } else if (countersink_style == "cylinder") { // Selects a cylindrical counterbore.
            cylinder( // Creates the cylindrical negative volume.
                h = countersink_depth + 0.02, // Adds a small extra depth for reliable boolean subtraction.
                d = safe_countersink_diameter, // Sets the counterbore diameter.
                center = false, // Starts the cylinder at the surface instead of centering it.
                $fn = 64 // Uses more facets for a smoother counterbore.
            ); // Ends the cylindrical counterbore.
        } else if (countersink_style == "nut") { // Selects a hexagonal metric nut pocket.
            rotate([0, 0, 30]) // Aligns the hex with flat sides across the visible pocket profile.
            cylinder( // Creates the hexagonal negative pocket for a metric nut.
                h = countersink_depth + 0.02, // Adds a small extra depth for reliable boolean subtraction.
                d = nut_corner_to_corner_diameter(nut_size, hole_diameter), // Uses the selected nut size plus clearance.
                center = false, // Starts the pocket at the surface instead of centering it.
                $fn = 6 // Uses six facets to match a hex nut.
            ); // Ends the hexagonal nut pocket.
        } // Ends the countersink-style selection.
    } // Ends the countersink rotation block.
} // Ends the single-countersink module.
